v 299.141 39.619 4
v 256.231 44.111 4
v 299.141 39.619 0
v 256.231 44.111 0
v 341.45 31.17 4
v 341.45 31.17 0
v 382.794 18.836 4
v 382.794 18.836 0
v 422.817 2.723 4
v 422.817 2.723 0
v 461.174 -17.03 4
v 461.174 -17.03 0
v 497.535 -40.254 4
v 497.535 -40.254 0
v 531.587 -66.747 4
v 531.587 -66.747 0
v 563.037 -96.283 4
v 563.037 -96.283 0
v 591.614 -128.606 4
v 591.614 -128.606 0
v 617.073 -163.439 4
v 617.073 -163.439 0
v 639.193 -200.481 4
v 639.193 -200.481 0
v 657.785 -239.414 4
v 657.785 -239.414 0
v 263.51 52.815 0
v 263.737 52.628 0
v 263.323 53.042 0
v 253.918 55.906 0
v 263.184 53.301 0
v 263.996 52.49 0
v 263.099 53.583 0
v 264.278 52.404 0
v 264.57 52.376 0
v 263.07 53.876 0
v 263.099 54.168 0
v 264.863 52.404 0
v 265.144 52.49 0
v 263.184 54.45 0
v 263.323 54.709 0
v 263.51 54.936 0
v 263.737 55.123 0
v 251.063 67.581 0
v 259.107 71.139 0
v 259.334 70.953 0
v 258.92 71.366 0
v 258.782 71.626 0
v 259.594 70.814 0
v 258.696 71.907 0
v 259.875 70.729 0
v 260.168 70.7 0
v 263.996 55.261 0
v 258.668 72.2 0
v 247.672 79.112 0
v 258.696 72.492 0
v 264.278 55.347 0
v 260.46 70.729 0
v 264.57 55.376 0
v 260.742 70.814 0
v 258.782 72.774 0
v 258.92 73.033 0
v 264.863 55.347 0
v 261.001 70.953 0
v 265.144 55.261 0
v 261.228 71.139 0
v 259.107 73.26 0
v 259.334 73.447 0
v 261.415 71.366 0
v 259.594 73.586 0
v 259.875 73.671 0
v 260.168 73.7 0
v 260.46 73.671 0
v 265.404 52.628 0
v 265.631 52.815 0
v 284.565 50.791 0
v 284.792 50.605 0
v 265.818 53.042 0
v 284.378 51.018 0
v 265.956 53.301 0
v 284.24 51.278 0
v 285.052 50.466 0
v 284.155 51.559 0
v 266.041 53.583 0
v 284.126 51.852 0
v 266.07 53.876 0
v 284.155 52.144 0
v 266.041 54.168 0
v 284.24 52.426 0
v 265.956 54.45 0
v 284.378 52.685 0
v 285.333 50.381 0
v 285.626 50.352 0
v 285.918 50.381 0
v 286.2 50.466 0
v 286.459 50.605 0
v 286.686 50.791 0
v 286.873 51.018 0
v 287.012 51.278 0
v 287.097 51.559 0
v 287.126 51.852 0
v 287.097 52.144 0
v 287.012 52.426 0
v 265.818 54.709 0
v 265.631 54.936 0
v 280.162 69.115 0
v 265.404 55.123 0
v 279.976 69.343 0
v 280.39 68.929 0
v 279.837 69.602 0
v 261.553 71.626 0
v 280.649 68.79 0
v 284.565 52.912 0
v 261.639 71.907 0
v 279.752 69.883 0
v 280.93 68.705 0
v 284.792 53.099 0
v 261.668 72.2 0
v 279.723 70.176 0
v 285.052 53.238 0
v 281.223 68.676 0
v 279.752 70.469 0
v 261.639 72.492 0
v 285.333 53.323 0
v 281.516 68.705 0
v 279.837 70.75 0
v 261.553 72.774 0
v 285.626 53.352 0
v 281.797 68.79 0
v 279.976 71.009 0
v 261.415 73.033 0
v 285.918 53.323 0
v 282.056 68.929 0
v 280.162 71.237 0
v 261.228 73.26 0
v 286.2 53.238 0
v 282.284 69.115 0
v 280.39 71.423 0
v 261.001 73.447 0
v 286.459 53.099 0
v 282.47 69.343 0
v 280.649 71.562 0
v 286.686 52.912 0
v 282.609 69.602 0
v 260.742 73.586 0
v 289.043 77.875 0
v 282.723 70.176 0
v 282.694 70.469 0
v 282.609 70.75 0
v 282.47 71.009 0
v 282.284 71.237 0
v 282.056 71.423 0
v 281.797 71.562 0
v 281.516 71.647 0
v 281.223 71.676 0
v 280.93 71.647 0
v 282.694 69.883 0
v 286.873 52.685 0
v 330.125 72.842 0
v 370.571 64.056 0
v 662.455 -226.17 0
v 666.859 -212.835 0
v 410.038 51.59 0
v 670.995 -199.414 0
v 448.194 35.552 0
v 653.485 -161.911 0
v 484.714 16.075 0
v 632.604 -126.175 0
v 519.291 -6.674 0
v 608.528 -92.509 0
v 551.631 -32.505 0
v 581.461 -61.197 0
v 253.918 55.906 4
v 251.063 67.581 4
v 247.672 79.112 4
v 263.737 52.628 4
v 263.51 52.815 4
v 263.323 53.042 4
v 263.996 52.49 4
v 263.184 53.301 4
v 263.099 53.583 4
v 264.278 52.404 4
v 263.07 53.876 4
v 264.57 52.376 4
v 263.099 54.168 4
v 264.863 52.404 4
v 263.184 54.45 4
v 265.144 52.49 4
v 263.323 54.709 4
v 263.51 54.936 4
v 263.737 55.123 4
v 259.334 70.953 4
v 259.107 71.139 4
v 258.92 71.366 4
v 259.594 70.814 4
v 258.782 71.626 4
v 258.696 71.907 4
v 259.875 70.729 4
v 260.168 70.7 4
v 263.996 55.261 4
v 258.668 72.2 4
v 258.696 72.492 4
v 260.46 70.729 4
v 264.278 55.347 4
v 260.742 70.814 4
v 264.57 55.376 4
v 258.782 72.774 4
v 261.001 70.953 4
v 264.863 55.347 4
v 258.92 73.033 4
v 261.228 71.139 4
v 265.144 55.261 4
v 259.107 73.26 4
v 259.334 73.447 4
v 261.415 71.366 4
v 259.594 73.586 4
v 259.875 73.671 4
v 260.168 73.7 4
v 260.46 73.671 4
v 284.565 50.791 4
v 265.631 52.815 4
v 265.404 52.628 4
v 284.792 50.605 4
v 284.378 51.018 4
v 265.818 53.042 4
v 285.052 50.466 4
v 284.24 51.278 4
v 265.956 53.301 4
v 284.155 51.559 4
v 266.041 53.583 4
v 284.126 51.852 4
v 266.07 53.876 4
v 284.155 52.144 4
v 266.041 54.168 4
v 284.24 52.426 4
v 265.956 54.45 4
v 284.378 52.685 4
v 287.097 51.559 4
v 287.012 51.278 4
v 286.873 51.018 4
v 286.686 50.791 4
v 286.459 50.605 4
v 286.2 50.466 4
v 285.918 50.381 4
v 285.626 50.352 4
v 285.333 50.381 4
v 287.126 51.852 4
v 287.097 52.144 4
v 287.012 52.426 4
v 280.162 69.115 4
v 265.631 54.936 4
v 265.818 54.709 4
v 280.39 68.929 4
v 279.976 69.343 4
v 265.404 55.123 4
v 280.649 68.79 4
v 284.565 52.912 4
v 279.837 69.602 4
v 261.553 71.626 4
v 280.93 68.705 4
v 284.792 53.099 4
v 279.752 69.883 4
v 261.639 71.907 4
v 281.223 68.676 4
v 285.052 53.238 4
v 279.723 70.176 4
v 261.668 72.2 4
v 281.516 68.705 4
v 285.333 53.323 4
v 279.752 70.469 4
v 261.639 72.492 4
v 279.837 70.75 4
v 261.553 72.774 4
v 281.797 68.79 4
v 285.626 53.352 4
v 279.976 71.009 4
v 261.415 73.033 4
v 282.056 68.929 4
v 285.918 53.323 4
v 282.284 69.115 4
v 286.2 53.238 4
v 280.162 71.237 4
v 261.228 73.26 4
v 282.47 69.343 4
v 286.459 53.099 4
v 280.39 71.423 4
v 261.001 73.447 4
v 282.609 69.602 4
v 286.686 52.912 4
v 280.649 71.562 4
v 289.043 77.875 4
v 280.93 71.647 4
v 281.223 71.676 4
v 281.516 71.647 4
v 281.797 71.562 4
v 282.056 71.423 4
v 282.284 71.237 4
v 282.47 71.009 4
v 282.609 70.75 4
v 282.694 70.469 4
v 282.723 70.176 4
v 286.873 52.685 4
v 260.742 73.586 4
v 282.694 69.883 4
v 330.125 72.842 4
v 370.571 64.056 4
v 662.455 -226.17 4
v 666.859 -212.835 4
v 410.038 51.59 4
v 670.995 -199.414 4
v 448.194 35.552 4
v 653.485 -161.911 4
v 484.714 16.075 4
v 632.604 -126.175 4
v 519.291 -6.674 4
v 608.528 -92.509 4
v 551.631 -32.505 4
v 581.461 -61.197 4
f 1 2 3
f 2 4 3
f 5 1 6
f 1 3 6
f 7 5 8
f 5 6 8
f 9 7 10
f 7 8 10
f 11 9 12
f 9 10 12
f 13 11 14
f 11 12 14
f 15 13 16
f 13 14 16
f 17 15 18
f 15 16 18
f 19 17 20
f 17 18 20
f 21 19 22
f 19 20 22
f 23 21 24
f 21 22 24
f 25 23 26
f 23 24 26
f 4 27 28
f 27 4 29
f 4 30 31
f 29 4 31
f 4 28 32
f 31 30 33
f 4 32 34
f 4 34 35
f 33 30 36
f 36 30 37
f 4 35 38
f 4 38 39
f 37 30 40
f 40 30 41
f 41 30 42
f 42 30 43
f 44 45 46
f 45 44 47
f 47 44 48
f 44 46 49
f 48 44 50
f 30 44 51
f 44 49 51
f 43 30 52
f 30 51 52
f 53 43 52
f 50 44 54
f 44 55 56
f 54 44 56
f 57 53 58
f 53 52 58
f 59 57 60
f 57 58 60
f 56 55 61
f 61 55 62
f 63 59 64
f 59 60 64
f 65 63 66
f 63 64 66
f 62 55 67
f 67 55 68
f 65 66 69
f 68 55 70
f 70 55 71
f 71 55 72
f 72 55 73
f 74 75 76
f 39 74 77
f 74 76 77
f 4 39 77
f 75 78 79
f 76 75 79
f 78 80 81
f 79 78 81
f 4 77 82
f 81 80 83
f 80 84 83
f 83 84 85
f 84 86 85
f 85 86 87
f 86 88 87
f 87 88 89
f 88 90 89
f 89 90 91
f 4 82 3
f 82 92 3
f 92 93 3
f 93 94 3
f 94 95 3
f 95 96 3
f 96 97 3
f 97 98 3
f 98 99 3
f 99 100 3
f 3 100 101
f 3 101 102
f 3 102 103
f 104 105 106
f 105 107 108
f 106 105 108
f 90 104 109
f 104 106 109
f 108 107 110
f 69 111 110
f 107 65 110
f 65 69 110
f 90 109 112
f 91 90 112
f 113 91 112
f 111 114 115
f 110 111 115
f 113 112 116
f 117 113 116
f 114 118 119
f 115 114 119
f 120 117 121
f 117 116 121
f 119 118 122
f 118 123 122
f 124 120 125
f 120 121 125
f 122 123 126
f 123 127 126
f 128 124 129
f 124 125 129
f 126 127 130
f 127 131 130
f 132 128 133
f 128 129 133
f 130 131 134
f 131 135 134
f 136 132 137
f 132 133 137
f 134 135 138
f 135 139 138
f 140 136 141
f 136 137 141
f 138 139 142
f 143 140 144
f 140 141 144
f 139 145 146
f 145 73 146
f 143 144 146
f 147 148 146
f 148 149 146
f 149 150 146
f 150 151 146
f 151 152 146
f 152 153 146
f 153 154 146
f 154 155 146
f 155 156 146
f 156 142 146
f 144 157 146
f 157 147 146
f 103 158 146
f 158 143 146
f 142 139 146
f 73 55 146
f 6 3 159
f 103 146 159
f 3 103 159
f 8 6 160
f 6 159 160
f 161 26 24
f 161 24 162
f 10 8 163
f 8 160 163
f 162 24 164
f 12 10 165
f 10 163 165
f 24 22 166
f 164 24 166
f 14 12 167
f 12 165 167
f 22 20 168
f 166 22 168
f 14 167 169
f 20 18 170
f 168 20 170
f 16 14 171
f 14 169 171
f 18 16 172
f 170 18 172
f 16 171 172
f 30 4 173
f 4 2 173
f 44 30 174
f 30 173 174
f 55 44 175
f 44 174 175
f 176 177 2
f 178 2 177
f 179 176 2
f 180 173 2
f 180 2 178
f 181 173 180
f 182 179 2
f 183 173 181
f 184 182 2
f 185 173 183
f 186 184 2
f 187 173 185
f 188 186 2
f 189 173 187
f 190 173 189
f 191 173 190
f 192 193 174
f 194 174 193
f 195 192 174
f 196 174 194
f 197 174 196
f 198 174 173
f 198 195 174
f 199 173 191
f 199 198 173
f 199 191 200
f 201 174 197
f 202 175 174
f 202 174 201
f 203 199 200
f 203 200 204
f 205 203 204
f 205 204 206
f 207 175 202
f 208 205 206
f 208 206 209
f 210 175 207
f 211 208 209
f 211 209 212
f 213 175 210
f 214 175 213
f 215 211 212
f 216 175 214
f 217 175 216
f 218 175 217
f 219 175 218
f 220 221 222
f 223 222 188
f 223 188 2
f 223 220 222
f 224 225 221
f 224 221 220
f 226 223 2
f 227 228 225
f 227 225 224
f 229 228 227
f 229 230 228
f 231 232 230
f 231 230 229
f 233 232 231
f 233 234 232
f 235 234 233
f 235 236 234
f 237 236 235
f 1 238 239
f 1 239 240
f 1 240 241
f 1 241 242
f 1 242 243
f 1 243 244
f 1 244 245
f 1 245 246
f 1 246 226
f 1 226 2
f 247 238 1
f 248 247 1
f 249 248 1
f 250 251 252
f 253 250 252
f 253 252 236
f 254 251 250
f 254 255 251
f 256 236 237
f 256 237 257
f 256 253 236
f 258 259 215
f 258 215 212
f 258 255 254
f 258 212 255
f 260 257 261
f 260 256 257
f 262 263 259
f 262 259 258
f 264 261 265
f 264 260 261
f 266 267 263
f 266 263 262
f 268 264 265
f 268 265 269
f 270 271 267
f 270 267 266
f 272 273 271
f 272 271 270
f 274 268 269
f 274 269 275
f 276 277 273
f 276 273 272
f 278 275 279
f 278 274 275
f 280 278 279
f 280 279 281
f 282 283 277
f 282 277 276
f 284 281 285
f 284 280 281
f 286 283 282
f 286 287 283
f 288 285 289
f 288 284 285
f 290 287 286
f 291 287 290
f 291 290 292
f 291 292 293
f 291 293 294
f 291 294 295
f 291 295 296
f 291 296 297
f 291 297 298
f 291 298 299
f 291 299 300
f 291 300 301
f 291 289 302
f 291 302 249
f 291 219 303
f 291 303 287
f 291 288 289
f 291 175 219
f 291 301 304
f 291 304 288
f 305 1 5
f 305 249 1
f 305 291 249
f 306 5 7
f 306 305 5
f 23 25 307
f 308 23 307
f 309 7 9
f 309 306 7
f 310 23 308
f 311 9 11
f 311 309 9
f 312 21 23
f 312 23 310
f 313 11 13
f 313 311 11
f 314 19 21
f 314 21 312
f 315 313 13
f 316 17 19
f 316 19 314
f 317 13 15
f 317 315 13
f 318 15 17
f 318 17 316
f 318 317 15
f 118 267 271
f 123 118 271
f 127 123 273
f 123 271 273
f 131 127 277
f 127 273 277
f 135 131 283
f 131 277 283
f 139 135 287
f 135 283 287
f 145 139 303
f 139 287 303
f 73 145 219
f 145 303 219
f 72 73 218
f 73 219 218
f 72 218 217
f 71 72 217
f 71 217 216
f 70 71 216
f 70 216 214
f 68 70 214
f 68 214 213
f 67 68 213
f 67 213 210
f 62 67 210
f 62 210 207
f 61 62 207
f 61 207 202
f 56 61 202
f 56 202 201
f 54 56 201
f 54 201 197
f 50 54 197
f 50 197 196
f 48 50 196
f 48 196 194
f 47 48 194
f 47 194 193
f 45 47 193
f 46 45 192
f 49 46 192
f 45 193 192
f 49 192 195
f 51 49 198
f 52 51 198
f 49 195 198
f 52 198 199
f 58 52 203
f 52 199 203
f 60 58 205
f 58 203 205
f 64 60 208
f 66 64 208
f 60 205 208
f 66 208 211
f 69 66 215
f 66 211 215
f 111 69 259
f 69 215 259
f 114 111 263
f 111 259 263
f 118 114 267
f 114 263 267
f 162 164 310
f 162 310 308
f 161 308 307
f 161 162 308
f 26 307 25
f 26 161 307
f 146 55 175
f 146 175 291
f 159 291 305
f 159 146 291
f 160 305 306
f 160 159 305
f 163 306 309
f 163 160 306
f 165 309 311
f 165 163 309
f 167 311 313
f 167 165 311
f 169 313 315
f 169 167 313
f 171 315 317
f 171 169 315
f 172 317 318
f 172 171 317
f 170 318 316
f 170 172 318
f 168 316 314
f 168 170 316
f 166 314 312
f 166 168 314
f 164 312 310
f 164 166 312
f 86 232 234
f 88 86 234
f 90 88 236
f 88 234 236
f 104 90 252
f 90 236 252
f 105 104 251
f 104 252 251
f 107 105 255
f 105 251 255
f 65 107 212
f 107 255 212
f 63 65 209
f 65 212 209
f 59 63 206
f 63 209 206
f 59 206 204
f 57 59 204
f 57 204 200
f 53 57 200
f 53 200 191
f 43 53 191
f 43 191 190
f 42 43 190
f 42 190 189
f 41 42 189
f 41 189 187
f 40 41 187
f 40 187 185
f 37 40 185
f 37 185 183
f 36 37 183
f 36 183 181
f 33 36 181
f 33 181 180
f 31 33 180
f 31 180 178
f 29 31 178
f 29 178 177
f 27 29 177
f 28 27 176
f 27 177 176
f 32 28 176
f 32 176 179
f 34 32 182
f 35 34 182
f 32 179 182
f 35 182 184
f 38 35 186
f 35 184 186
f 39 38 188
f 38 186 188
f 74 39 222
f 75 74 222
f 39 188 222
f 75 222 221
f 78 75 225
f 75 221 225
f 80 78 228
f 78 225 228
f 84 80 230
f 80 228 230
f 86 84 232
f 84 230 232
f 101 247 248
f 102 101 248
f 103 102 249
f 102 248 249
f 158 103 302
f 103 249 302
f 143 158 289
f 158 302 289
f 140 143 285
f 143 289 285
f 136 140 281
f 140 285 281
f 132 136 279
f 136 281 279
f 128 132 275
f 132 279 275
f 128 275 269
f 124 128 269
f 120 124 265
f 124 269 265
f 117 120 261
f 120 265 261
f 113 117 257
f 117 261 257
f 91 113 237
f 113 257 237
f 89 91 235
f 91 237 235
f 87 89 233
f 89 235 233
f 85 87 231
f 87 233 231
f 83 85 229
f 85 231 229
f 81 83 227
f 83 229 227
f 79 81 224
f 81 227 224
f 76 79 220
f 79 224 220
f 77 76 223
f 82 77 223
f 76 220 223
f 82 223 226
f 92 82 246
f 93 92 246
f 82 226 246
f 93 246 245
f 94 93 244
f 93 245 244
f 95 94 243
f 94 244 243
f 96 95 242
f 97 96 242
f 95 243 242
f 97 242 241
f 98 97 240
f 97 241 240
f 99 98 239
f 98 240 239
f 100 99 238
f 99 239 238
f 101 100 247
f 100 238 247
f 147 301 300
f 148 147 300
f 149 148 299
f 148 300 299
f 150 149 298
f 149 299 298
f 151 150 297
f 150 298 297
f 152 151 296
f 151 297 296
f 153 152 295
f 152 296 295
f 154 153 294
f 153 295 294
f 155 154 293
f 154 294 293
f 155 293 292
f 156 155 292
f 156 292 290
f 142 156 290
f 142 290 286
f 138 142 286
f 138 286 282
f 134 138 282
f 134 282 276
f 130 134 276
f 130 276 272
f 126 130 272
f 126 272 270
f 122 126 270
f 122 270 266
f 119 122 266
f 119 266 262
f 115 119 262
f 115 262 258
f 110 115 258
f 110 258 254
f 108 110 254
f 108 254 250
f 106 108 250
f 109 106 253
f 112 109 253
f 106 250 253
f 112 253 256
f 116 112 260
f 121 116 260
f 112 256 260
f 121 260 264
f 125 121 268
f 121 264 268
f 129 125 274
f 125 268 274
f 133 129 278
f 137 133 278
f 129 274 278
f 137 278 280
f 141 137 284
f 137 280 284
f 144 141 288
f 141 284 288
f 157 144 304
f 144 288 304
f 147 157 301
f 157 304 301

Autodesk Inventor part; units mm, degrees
ref_plane "YZ Plane" through (0, 0, 0) normal (1, 0, 0) x (0, 1, 0)
ref_plane "XZ Plane" through (0, 0, 0) normal (0, 1, 0) x (-1, 0, 0)
ref_plane "XY Plane" through (0, 0, 0) normal (0, 0, 1) x (1, 0, 0)
sketch "Sketch1" plane through (0, 0, 0) normal (0, 0, 1) x (1, 0, 0)
  arc A0 (670.9948, -199.4141) -> (0, 0) centre (254.9219, -370.8299) ccw
  arc A1 (657.7848, -239.4141) -> (30, 0) centre (229.3296, -420.1103) ccw
  arc A2 (657.7848, -239.4141) -> (670.9948, -199.4141) centre (0, 0) ccw
  line L0 (0, 0) -> (30, 0)
  line L1 (657.7848, -239.4141) -> (0, 0)
  line L2 (-143.7228, 0) -> (862.3369, 0) projected
  point P0 (0, 0)
  dimension "d1" = 30
  dimension "d2" = 40
  dimension "d4" = 20
  dimension "d5" = 465
  dimension "d6" = 450
  dimension "d22" = 700
extrude "Extrusion1" add sketch "Sketch1" along normal blind 4 contours A2 A1 L2 A0 | L2 A1 L0 A0
sketch "Sketch2" plane through (0, 0, 4) normal (0, 0, 1) x (1, 0, 0)
  arc A0 (670.9948, -199.4141) -> (0, 0) centre (254.9219, -370.8299) ccw projected
  arc A1 (87.1309, 22.5434) -> (74.166, 50.9844) centre (0, 0) ccw
  line L0 (74.166, 50.9844) -> (0, 0)
  line L1 (0, 0) -> (87.1309, 22.5434)
  line L2 (0, 0) -> (30, 0) projected
  point P0 (78.8927, 43.3122)
  point P1 (0, 0)
  point P2 (0, 0)
  dimension "d9" = 90
  dimension "d16" = 20
extrude "Extrusion2" add sketch "Sketch2" against normal blind 4
sketch "Sketch4" plane through (0, 0, 4) normal (0, 0, 1) x (1, 0, 0)
  line L0 (86.0304, 22.2587) -> (87.1309, 22.5434) projected
  line L1 (74.166, 50.9844) -> (0, 0) projected
  line L2 (87.1309, 22.5434) -> (0, 0)
  line L3 (0, 0) -> (30, 0)
  arc A0 (86.0304, 22.2587) -> (30, 0) centre (229.3296, -420.1103) ccw projected
  line L4 (30, 0) -> (86.0304, 22.2587)
  point P0 (86.0304, 22.2587)
extrude "Extrusion4" cut sketch "Sketch4" against normal blind 10 contours A0 L3 L2
sketch "Sketch5" plane through (0, 0, 4) normal (0, 0, 1) x (1, 0, 0)
  line L0 (0, 0) -> (8.2407, 5.6649)
  line L1 (74.166, 50.9844) -> (0, 0) projected
  line L2 (0, 0) -> (87.1309, 22.5434) projected
  line L3 (9.6812, 2.5048) -> (0, 0)
  arc A0 (9.6812, 2.5048) -> (8.2407, 5.6649) centre (0, 0) ccw
  point P0 (9.6812, 2.5048)
  dimension "d21" = 10
extrude "Extrusion5" cut sketch "Sketch5" against normal blind 10
sketch "Sketch6" plane through (0, 0, 4) normal (0, 0, 1) x (1, 0, 0)
  arc A0 (670.9948, -199.4141) -> (78.8927, 43.3122) centre (254.9219, -370.8299) ccw projected
  arc A1 (258.8056, -24.8926) -> (214.2573, 147.2882) centre (0, 0) ccw
  line L0 (0, 0) -> (214.2573, 147.2882)
  line L1 (0, 0) -> (258.8056, -24.8926)
  line L2 (74.166, 50.9844) -> (8.2407, 5.6649) projected
  dimension "d23" = 40
  dimension "d24" = 260
extrude "Extrusion6" cut sketch "Sketch6" against normal blind 10
sketch "Sketch7" plane through (0, 0, 4) normal (0, 0, 1) x (1, 0, 0)
  line L0 (0, 0) -> (260.1676, 72.1998)
  line L1 (0, 0) -> (264.5703, 53.8755)
  line L2 (-134.199, 0) -> (805.1938, 0) projected
  circle A0 centre (260.1676, 72.1998) radius 1.5
  circle A1 centre (264.5703, 53.8755) radius 1.5
  circle A2 centre (281.223, 70.1761) radius 1.5
  circle A3 centre (285.6257, 51.8518) radius 1.5
  line L3 (281.223, 70.1761) -> (285.6257, 51.8518)
  line L4 (285.6257, 51.8518) -> (264.5703, 53.8755)
  line L5 (264.5703, 53.8755) -> (260.1676, 72.1998)
  line L6 (281.223, 70.1761) -> (260.1676, 72.1998)
  dimension "d27" = 15.51
  dimension "d28" = 4
  dimension "d29" = 270
  dimension "d30" = 270
  dimension "d31" = 3
  dimension "d32" = 3
  dimension "d33" = 3
  dimension "d34" = 3
  dimension "d35" = 109
  dimension "d36" = 20
extrude "Extrusion7" cut sketch "Sketch7" against normal through all contours A0 L6 L0 | L0 L5 A0 | A1 L5 L1 | L1 L4 A1 | L6 A0 L5 | L5 A1 L4 | L4 L3 A3 | A3 L3 L4 | L6 L3 A2 | A2 L3 L6
properties part number "spoke4"
